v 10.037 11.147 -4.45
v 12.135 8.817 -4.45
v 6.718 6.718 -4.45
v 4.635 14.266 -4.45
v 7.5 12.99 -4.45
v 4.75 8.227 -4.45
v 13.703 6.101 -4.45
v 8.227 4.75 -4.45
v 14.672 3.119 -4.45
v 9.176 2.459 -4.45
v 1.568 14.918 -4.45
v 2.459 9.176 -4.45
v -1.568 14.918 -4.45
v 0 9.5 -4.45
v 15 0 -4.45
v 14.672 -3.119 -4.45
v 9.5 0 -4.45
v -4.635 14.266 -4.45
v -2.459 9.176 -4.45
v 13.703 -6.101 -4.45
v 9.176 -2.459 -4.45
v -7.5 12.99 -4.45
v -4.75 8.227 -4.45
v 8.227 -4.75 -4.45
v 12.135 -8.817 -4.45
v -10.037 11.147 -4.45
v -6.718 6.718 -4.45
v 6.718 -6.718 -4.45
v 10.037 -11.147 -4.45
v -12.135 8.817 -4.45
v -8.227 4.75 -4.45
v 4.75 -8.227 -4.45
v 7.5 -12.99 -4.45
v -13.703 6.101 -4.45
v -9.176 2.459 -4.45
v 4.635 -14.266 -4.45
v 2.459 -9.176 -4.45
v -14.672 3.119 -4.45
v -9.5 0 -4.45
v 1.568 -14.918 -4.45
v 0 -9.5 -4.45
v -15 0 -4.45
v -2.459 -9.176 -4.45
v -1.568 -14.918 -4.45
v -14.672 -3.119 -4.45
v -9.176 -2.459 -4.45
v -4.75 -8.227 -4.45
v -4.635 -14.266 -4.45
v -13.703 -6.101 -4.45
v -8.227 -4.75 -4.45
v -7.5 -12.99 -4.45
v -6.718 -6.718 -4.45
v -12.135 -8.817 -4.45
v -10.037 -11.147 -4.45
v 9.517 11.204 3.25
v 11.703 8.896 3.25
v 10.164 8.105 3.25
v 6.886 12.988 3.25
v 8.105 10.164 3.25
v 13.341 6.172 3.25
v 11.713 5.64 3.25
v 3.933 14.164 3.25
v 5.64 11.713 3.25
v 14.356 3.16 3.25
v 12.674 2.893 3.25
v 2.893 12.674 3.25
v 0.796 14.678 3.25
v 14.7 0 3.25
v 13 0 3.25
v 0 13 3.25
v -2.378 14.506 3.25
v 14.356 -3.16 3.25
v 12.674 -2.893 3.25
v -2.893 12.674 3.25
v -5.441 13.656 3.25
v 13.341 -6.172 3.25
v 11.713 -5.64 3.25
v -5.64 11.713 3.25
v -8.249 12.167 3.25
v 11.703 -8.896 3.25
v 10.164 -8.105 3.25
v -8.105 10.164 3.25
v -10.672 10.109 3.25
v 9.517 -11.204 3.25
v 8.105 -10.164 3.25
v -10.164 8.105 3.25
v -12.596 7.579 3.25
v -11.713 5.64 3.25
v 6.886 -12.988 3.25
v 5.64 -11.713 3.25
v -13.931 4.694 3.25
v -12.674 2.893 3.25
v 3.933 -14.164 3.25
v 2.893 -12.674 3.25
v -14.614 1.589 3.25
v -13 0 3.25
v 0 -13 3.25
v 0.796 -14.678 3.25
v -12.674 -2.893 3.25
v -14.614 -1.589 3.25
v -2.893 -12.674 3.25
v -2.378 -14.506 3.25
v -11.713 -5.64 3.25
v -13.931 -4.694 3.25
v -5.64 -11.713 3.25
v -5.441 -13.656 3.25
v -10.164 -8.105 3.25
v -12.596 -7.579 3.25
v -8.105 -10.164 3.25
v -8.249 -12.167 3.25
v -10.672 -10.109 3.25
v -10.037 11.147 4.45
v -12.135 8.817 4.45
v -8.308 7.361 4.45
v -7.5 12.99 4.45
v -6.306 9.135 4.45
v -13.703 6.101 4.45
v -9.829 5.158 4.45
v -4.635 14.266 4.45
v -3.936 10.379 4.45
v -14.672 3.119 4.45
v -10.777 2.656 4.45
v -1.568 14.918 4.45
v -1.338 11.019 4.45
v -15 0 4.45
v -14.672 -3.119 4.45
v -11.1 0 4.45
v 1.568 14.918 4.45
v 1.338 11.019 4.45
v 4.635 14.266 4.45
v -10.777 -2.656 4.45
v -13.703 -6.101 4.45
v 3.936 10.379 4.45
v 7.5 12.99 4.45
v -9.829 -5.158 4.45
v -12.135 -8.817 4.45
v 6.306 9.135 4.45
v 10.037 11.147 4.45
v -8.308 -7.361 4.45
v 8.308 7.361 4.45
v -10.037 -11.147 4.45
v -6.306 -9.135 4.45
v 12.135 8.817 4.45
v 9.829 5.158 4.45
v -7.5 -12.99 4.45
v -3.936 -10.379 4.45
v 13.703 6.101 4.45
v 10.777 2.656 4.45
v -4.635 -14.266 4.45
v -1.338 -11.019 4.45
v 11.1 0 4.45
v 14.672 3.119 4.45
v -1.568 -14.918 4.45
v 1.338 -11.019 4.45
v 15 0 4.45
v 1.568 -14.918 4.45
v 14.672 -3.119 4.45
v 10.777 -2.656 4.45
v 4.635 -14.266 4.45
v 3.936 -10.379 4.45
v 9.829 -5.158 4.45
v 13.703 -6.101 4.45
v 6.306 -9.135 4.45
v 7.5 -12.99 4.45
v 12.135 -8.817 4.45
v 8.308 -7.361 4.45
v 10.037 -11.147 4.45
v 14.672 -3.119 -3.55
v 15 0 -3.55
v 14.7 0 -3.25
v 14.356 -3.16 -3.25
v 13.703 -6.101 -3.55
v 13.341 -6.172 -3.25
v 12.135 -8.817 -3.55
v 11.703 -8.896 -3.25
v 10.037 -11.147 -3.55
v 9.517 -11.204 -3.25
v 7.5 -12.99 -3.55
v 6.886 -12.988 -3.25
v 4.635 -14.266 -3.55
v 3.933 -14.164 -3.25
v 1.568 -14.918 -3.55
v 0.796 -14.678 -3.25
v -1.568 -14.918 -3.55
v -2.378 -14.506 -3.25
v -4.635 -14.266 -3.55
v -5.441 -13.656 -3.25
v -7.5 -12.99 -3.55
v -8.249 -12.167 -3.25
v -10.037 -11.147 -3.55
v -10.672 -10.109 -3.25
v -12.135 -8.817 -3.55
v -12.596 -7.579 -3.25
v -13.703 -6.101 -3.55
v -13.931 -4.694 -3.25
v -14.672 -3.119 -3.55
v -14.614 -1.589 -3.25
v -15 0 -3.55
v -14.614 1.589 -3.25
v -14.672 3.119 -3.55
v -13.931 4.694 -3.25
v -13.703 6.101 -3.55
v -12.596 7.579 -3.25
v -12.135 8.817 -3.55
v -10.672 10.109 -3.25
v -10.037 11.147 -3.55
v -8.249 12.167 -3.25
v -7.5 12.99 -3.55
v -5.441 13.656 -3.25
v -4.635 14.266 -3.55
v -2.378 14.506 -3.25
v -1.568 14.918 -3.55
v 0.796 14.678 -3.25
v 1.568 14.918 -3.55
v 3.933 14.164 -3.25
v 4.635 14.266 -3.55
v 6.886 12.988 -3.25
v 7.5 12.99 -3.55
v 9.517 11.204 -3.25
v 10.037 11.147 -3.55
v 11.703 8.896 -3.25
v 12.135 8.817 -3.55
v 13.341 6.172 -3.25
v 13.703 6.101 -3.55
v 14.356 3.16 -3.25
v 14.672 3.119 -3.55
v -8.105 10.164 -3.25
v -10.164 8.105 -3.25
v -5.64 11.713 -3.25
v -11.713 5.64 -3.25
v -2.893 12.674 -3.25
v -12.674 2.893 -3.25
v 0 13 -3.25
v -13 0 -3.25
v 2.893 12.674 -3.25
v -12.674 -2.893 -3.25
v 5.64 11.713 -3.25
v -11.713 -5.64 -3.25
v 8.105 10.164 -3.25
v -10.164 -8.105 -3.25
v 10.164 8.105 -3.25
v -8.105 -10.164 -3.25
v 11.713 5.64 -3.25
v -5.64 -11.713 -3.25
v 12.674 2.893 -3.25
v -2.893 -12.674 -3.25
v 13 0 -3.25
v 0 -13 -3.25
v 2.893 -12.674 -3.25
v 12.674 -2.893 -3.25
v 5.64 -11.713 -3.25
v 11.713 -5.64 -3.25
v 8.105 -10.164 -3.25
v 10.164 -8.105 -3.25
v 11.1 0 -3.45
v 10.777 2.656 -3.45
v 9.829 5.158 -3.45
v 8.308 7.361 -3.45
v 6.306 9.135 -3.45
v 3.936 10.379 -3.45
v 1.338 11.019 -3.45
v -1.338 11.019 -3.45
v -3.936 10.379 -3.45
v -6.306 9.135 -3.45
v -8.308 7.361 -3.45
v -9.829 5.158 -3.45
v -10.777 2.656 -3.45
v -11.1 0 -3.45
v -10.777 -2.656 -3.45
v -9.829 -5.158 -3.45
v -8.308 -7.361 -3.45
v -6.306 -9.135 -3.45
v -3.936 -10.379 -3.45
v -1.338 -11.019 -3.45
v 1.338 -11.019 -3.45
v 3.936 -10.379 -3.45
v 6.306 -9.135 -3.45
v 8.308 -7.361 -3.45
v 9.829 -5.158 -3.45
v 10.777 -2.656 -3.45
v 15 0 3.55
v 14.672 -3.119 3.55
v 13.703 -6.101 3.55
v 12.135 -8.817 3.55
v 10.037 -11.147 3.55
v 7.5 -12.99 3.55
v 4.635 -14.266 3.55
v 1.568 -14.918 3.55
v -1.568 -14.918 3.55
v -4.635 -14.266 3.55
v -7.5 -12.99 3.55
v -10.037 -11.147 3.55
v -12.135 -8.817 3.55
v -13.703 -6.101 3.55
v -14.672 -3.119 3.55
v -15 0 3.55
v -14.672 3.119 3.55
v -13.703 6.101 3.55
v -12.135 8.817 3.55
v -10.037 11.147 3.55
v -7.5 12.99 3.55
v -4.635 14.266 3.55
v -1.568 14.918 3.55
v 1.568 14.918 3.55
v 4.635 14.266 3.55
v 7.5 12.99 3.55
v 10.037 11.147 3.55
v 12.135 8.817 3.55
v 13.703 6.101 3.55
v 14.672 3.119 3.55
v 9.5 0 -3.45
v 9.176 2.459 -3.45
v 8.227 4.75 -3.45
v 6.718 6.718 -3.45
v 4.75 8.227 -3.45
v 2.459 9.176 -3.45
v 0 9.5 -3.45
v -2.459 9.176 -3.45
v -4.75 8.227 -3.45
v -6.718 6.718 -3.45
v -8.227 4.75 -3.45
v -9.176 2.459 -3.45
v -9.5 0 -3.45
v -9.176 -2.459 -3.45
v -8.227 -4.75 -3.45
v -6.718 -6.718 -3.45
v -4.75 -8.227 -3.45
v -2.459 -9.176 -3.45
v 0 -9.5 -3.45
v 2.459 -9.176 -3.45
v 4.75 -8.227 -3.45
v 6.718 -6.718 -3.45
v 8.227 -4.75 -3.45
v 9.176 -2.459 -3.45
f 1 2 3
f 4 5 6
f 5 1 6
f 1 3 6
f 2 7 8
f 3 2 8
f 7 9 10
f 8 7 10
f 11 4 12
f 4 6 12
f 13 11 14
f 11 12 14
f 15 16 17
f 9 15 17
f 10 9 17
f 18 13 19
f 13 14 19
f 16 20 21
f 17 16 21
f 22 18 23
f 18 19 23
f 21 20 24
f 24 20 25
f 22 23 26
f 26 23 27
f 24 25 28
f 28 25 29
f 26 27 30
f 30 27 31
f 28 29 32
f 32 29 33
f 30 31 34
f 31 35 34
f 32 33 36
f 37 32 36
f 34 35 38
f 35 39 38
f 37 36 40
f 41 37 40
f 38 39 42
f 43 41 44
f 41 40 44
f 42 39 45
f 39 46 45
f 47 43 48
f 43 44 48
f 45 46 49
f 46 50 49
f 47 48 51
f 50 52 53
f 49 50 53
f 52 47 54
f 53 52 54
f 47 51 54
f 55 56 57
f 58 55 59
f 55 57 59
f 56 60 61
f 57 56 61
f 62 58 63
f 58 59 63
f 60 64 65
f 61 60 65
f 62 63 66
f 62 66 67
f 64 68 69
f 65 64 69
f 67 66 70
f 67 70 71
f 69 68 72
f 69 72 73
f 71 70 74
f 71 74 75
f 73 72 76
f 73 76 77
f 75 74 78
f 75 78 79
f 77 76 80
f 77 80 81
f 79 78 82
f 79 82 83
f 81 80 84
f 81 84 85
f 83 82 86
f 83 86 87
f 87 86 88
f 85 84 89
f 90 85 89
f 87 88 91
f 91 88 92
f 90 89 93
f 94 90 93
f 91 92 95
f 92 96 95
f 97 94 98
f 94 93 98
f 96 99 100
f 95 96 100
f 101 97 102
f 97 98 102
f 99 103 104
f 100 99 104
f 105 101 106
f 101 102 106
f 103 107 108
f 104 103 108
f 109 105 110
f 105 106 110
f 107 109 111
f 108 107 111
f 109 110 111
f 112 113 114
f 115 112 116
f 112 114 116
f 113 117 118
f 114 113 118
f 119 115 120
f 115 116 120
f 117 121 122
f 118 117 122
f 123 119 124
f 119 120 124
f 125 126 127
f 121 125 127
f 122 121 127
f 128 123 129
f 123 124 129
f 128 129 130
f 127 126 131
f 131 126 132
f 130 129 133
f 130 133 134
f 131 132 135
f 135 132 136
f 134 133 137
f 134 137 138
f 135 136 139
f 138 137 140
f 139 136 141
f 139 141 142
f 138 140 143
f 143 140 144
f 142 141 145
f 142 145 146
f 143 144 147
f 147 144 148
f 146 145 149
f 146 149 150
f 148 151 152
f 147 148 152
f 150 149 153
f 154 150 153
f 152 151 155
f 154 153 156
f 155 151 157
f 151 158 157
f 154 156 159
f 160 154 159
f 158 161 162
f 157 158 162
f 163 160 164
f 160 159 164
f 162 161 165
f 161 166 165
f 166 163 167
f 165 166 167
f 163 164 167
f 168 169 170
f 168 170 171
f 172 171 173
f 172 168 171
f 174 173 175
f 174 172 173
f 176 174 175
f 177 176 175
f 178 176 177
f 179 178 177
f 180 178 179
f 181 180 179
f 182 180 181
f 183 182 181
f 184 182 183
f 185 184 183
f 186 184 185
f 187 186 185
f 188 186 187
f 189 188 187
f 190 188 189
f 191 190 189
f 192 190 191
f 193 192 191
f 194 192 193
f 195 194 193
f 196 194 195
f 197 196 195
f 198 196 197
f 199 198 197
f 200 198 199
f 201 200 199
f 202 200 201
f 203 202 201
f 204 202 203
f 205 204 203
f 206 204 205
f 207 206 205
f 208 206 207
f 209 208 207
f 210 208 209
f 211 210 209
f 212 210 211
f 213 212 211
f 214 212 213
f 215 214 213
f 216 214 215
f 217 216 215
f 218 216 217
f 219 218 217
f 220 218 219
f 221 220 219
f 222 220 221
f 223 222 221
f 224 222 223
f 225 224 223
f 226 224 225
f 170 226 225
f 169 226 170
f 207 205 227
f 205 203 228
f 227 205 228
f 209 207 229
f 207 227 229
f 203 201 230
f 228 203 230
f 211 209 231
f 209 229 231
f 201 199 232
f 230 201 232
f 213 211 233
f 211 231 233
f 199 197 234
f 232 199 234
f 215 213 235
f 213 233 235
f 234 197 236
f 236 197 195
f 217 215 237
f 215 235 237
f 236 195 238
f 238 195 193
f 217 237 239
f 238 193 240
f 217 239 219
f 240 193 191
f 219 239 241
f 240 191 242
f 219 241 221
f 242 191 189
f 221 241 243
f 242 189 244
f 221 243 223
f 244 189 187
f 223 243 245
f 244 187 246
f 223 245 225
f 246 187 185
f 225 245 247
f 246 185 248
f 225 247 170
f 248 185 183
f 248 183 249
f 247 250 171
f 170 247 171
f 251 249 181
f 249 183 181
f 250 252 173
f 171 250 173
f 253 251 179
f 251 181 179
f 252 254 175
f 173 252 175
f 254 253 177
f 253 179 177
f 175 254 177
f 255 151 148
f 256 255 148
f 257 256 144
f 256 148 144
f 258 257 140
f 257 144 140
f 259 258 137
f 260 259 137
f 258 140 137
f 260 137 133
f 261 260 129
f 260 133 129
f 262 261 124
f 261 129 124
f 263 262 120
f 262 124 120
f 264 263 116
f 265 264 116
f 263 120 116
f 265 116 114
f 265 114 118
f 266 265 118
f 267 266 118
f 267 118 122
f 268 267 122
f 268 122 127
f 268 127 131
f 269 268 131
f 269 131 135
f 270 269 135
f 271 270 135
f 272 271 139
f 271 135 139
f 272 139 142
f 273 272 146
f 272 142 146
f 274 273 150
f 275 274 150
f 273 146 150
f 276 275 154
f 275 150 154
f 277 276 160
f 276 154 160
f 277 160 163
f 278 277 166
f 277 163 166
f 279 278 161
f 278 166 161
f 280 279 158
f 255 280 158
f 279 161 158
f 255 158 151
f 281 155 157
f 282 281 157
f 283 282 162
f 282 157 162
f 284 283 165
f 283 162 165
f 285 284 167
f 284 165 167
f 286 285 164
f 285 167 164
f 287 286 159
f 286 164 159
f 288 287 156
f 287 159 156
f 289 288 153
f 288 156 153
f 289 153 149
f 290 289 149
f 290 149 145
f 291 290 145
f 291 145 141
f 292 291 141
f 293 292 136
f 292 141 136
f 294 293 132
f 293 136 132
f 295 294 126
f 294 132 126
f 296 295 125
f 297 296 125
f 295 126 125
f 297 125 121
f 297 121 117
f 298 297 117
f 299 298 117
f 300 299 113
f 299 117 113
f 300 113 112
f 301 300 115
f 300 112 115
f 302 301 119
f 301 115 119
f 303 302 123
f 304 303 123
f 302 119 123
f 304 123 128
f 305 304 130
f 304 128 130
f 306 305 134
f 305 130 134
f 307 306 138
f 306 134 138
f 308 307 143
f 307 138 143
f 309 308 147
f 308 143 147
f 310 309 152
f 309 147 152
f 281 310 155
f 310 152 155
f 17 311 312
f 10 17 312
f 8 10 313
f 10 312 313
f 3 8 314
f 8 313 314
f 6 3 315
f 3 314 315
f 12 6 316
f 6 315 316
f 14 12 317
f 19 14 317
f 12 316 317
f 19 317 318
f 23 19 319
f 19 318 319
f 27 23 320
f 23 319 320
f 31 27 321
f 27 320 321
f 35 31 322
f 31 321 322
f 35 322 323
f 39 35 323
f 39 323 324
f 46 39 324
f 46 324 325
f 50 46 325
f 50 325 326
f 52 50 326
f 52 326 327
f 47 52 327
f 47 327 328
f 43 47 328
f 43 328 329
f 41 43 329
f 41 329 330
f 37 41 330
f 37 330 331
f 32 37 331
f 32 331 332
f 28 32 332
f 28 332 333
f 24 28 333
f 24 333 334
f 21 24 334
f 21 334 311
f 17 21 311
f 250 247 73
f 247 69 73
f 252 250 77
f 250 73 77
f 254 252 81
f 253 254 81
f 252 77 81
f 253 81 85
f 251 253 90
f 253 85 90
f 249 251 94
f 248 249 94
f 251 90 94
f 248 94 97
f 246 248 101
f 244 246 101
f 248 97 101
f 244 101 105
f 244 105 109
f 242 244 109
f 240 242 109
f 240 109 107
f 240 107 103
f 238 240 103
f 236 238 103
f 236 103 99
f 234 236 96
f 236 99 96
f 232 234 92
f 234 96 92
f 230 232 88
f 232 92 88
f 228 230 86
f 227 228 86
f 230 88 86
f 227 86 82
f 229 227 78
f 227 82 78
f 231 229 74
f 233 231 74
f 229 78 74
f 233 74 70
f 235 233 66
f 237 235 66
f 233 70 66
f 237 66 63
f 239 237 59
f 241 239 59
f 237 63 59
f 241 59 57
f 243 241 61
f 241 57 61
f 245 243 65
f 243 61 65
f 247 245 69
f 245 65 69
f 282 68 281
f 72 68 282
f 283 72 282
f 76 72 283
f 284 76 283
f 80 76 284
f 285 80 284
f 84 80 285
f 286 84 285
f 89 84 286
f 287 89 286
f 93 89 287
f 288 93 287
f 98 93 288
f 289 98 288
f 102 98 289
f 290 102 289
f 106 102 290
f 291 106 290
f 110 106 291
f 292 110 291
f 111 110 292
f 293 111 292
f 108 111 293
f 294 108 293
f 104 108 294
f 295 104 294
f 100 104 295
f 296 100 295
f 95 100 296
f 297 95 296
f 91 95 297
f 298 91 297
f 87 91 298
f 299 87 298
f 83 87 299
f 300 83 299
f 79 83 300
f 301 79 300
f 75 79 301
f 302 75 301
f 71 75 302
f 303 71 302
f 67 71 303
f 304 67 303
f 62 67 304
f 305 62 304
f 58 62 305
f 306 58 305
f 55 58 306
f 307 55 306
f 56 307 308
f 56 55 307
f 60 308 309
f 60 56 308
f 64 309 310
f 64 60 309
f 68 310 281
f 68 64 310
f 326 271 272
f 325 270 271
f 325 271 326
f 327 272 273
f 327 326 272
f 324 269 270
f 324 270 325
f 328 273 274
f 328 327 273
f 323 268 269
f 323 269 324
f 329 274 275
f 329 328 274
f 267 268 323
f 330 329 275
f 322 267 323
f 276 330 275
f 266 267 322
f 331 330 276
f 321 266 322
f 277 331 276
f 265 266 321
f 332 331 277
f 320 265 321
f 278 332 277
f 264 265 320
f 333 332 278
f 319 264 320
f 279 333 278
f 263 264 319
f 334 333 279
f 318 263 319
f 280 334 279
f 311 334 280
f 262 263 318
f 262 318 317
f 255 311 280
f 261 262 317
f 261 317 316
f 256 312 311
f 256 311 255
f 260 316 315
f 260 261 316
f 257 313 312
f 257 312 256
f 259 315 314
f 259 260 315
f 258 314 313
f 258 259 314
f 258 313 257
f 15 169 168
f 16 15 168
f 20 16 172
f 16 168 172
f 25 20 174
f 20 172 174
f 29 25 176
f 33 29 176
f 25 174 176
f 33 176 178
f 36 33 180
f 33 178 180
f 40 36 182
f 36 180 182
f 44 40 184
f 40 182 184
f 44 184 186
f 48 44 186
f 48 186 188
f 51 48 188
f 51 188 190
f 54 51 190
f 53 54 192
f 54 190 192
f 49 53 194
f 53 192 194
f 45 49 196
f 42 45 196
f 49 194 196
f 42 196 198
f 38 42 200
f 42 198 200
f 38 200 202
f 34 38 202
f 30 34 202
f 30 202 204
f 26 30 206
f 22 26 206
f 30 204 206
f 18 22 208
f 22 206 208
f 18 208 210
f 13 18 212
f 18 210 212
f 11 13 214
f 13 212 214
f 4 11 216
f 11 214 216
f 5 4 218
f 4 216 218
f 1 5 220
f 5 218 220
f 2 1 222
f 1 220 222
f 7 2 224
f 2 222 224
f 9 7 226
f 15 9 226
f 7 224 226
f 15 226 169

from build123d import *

# Parameters (mm, degrees)
F2_R     = 9.5
F3_DEPTH = 8.9
F2_R_2   = 11.1
F4_DEPTH = 7.9
F5_SIZE  = 0.3


with BuildPart() as f1:
    # F0 (on Front) → F1 (revolve)
    with BuildSketch(Plane.XZ):
        Polygon((15, 4.45), (0, 4.45), (0, -4.45), (15, -4.45), (15, -3.25), (13, -3.25), (13, 3.25), (15, 3.25), align=None)
    revolve(axis=Axis((0, 0, 0), (0, 0, -1)))

    # F2 (on face) → F3 (cut, through all)
    with BuildSketch(Plane.XY.offset(4.45)):
        Circle(F2_R)
    extrude(amount=-F3_DEPTH, mode=Mode.SUBTRACT)

    # F2 (on face) → F4 (cut)
    with BuildSketch(Plane.XY.offset(4.45)):
        Circle(F2_R_2)
        Circle(F2_R, mode=Mode.SUBTRACT)
    extrude(amount=-F4_DEPTH, mode=Mode.SUBTRACT)

    # F5
    f5_edges = [f1.edges().sort_by_distance(p)[0] for p in [
        (-15, 0, -3.25),
        (-15, 0, 3.25),
    ]]
    chamfer(f5_edges, length=F5_SIZE)


solid = f1.part
